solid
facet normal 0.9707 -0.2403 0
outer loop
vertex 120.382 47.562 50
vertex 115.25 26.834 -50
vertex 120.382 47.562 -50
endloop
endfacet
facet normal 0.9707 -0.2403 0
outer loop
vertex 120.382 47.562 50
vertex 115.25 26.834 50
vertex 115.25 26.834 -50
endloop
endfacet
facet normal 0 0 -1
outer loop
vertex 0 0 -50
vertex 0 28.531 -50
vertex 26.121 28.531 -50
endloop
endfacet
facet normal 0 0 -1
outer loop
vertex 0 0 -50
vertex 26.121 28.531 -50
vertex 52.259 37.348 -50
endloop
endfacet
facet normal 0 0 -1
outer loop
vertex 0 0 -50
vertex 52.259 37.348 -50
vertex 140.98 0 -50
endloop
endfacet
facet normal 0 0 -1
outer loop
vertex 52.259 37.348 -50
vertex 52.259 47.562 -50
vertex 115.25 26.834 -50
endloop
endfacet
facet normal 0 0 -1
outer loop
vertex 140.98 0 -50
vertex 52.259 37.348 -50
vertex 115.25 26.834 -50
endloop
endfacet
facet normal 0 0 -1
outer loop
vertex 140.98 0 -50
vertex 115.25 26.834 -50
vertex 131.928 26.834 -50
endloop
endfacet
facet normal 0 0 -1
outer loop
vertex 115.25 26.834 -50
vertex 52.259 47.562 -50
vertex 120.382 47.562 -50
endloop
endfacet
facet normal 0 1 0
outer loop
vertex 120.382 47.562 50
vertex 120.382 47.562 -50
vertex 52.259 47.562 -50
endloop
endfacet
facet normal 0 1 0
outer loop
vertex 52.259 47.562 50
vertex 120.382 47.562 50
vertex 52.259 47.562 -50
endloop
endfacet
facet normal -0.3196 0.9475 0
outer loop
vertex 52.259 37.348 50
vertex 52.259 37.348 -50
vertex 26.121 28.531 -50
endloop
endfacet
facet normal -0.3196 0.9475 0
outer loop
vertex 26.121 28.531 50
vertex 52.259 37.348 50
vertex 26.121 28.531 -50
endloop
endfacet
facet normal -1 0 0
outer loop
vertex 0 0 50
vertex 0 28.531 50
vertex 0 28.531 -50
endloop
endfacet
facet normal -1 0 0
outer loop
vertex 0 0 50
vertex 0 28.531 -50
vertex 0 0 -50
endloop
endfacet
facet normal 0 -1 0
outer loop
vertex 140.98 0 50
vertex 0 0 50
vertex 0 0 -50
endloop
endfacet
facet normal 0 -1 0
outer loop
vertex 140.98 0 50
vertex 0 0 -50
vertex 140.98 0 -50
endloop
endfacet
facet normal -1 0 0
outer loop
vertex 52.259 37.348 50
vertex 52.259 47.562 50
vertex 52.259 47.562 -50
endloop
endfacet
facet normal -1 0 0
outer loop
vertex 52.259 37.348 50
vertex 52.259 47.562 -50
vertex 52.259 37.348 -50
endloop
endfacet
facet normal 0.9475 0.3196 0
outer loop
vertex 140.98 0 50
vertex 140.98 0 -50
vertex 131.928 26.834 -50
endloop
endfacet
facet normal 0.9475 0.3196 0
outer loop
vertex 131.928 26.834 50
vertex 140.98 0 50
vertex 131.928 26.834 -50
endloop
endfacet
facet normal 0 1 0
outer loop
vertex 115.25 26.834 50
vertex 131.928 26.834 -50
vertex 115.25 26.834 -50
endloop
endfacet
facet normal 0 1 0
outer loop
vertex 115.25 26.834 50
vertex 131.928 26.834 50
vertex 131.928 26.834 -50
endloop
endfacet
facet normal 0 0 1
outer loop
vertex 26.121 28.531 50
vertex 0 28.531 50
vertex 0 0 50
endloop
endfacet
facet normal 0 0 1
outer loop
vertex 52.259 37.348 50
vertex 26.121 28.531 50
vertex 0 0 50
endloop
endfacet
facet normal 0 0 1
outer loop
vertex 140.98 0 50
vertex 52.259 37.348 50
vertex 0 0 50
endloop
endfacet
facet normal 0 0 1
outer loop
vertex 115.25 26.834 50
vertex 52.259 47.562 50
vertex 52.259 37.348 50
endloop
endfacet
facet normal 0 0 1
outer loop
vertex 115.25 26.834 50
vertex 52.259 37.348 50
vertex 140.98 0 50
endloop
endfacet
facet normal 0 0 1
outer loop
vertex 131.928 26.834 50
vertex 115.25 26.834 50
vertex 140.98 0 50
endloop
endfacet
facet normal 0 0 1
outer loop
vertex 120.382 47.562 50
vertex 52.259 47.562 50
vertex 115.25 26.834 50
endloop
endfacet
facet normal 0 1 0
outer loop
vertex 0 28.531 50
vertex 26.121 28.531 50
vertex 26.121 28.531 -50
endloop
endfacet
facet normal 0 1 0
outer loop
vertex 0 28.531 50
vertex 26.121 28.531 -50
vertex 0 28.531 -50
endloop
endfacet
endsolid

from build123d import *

# Parameters (mm, degrees)
EXTRUDE_1_DEPTH                = 50
SPLIT_BODIES_1_SURFACE_1_BACK  = 226.829
SPLIT_BODIES_1_SURFACE_1_DEPTH = 453.658
SPLIT_BODIES_1_SURFACE_2_BACK  = 226.829
SPLIT_BODIES_1_SURFACE_2_DEPTH = 453.658


with BuildPart() as part:
    # 草图2 → 凸台-拉伸1 (new, symmetric)
    with BuildSketch(Plane.XY):
        with BuildLine():
            Line((120.381757685, 47.561632043), (136.603924057, 47.561632043))
            Line((136.603924057, 47.561632043), (146.850265064, 88.947420909))
            ThreePointArc((146.850265064, 88.947420909), (104.62030332, 85.070472378), (109.988846824, 127.136838271))
            Line((109.988846824, 127.136838271), (88.280849451, 128.197534042))
            ThreePointArc((88.280849451, 128.197534042), (80.571822415, 123.964886157), (80.863683371, 115.175163571))
            ThreePointArc((80.863683371, 115.175163571), (88.300101913, 100.587398022), (92.288223879, 84.706651578))
            Line((92.288223879, 84.706651578), (52.259104564, 84.706651578))
            Line((52.259104564, 84.706651578), (52.259104564, 37.347972633))
            Line((52.259104564, 37.347972633), (26.12059868, 28.530814049))
            Line((26.12059868, 28.530814049), (0, 28.530814049))
            Line((0, 28.530814049), (0, 0))
            Line((0, 0), (140.98, 0))
            Line((140.98, 0), (131.928221984, 26.834036233))
            Line((131.928221984, 26.834036233), (115.249995775, 26.834036233))
            Line((115.249995775, 26.834036233), (120.381757685, 47.561632043))
        make_face()
        with BuildLine():
            ThreePointArc((109.988846824, 127.136838271), (104.62030332, 85.070472378), (146.850265064, 88.947420909))
            Line((146.850265064, 88.947420909), (151.231226865, 106.642475172))
            ThreePointArc((151.231226865, 106.642475172), (147.884639105, 117.258207331), (140.564064785, 125.64287253))
            Line((140.564064785, 125.64287253), (109.988846824, 127.136838271))
        make_face()
        with BuildLine():
            ThreePointArc((140.564064785, 125.64287253), (125.506724817, 131.102497099), (109.988846824, 127.136838271))
            Line((109.988846824, 127.136838271), (140.564064785, 125.64287253))
        make_face()
        with BuildLine():
            ThreePointArc((140.564064785, 125.64287253), (147.884639105, 117.258207331), (151.231226865, 106.642475172))
            Line((151.231226865, 106.642475172), (154.115877694, 118.293810031))
            ThreePointArc((154.115877694, 118.293810031), (153.172952645, 122.982290954), (148.95330104, 125.232957822))
            Line((148.95330104, 125.232957822), (140.564064785, 125.64287253))
        make_face()
    extrude(amount=EXTRUDE_1_DEPTH, both=True)


with BuildPart() as body_2:
    # Split Bodies 1: the piece behind the surface
    add(part.part)
    # Split Bodies 1 surface: a surface, the sketch's curves swept straight by 453.658 mm
    with BuildLine(Plane.XY.offset(50).offset(-SPLIT_BODIES_1_SURFACE_1_BACK), mode=Mode.PRIVATE) as split_bodies_1_surface_1_path:
        Line((120.381757685, 47.561632043), (52.259104564, 47.561632043))
    split_bodies_1_surface_1 = Shell.extrude(split_bodies_1_surface_1_path.wire(), (0 * SPLIT_BODIES_1_SURFACE_1_DEPTH, 0 * SPLIT_BODIES_1_SURFACE_1_DEPTH, 1 * SPLIT_BODIES_1_SURFACE_1_DEPTH))
    split(bisect_by=split_bodies_1_surface_1, keep=Keep.BOTTOM)


with BuildPart() as part_1:
    add(part.part)

    # Split Bodies 1: split by a surface, the side it looks to stays
    # Split Bodies 1 surface: a surface, the sketch's curves swept straight by 453.658 mm
    with BuildLine(Plane.XY.offset(50).offset(-SPLIT_BODIES_1_SURFACE_2_BACK), mode=Mode.PRIVATE) as split_bodies_1_surface_2_path:
        Line((120.381757685, 47.561632043), (52.259104564, 47.561632043))
    split_bodies_1_surface_2 = Shell.extrude(split_bodies_1_surface_2_path.wire(), (0 * SPLIT_BODIES_1_SURFACE_2_DEPTH, 0 * SPLIT_BODIES_1_SURFACE_2_DEPTH, 1 * SPLIT_BODIES_1_SURFACE_2_DEPTH))
    split(bisect_by=split_bodies_1_surface_2, keep=Keep.TOP)


solid = part_1.part
